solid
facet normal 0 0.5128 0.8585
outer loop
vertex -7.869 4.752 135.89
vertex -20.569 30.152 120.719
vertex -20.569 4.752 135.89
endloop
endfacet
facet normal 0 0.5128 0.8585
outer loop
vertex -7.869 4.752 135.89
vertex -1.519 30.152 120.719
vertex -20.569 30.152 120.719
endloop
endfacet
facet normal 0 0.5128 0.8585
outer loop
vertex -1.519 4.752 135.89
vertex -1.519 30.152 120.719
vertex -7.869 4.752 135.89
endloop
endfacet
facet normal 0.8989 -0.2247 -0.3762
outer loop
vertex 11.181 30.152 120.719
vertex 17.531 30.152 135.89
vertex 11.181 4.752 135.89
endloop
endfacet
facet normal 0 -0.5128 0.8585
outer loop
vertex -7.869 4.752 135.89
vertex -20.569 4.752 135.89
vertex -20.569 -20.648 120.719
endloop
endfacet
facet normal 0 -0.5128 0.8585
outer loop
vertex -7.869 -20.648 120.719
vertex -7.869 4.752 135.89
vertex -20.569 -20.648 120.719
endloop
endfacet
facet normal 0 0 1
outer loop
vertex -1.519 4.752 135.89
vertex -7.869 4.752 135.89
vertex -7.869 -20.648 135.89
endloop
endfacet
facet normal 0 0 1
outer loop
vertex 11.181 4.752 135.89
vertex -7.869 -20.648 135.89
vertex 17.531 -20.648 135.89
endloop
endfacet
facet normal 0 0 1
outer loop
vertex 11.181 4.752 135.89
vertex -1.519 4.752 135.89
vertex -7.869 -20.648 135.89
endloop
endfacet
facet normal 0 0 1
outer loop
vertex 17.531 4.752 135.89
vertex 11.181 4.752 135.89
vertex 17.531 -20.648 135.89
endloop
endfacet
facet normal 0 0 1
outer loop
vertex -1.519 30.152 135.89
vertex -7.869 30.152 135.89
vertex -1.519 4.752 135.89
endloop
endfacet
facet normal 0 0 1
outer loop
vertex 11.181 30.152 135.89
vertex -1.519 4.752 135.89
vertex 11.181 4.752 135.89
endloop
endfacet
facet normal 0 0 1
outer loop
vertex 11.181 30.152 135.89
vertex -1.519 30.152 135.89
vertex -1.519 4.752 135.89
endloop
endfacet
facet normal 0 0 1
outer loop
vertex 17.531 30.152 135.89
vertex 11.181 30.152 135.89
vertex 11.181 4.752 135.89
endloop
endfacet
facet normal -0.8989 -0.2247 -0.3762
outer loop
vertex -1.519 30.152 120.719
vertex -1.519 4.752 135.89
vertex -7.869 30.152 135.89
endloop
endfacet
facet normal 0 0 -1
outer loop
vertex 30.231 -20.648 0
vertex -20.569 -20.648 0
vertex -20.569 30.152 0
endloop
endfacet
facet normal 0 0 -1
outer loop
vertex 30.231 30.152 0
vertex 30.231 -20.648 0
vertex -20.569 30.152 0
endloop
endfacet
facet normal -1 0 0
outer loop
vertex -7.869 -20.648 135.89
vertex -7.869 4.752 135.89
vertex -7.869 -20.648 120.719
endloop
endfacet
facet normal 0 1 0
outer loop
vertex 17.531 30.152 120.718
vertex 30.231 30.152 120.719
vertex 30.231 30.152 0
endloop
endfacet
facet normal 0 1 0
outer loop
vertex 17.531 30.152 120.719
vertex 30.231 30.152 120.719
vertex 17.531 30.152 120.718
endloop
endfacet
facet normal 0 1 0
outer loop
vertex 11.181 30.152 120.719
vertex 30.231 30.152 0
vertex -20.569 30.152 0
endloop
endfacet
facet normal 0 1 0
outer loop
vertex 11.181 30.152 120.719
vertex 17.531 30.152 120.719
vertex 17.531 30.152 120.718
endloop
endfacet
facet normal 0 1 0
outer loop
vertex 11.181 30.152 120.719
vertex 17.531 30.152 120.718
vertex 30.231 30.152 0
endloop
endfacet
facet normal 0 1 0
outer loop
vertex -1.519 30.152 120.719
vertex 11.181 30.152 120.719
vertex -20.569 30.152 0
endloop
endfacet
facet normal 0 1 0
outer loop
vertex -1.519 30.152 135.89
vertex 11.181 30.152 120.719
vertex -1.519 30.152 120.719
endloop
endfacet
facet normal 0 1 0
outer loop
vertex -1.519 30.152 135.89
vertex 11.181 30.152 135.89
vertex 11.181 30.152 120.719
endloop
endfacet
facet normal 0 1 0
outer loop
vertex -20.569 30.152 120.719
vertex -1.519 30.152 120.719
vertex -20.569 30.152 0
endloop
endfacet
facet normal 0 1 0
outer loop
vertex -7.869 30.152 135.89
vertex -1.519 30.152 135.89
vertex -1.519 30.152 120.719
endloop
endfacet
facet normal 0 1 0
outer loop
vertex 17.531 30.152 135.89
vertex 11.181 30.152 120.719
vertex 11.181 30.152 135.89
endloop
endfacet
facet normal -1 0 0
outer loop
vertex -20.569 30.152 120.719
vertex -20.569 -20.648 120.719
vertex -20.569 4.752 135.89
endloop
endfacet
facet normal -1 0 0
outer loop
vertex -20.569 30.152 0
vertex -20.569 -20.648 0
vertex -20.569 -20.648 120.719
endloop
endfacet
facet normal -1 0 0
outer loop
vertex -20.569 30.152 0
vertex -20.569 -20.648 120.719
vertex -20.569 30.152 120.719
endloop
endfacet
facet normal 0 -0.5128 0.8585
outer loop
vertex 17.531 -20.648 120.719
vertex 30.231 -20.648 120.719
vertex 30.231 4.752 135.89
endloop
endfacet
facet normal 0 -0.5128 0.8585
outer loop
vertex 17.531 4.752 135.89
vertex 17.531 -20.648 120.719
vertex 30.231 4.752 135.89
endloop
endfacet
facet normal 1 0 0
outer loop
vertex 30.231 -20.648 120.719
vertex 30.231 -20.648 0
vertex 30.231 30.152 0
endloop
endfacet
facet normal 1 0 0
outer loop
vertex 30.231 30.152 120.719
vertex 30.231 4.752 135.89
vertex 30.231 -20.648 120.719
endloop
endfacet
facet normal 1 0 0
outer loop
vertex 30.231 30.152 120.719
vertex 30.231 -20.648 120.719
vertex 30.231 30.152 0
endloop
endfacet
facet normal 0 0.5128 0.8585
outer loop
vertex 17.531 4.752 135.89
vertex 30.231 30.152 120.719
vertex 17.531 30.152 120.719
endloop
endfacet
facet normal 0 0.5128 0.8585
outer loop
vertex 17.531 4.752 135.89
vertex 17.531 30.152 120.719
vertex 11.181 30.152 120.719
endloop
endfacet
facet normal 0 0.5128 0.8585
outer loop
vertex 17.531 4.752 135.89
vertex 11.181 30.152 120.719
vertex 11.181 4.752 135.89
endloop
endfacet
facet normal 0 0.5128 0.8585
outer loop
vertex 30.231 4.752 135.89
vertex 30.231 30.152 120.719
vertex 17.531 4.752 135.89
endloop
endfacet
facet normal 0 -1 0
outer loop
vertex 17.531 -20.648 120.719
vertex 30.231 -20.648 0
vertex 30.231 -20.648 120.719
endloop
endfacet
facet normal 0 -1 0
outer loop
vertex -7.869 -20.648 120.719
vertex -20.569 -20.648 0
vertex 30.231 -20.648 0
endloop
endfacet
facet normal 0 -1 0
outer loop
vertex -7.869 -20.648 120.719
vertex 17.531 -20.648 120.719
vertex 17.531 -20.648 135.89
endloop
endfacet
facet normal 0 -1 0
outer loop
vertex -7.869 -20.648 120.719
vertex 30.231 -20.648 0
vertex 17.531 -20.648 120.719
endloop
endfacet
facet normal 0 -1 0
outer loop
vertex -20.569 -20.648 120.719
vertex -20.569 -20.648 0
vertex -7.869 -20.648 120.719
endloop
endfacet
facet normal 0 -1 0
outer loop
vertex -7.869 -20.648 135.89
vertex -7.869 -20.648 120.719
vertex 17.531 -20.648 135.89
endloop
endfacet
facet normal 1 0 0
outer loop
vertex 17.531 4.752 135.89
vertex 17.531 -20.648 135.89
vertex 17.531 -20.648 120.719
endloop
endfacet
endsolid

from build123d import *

# Parameters (mm, degrees)
F0_W      = 50.8
F0_H      = 50.8
F1_DEPTH  = 135.89
F6_DEPTH  = 50.8
F11_W     = 12.7
F11_H     = 15.1711734065
F12_DEPTH = 27.7114
F13_DEPTH = 36.9062
F14_DEPTH = 15.1721734065
F17_DEPTH = 5.8166
F18_DEPTH = 25.654
F20_DEPTH = 50.8
F23_DEPTH = 9.906
F24_DEPTH = 28.194
F26_DEPTH = 3.556
F27_DEPTH = 33.528
F29_DEPTH = 12.7
F31_DEPTH = 12.7


with BuildPart() as f1:
    # F0 (on Top) → F1 (new body)
    with BuildSketch(Plane.XY):
        with Locations((4.8314797107, 4.7515430488)):
            Rectangle(F0_W, F0_H)
    extrude(amount=F1_DEPTH)

    # F5 (on face) + F3 (on face) → F6 (cut)
    with BuildSketch(Plane(origin=(-20.5685202893, 0, 0), x_dir=(0, -1, 0), z_dir=(-1, 0, 0))):
        Polygon((-4.7515430488, 120.7188265935), (-4.7515430488, 135.89), (-30.1515430488, 120.7188265935), align=None)
    with BuildSketch(Plane(origin=(-20.5685202893, 0, 0), x_dir=(0, -1, 0), z_dir=(-1, 0, 0))):
        Polygon((-30.1515430488, 135.89), (-30.1515430488, 120.7188265935), (-4.7515430488, 135.89), align=None)
    extrude(amount=-F6_DEPTH, mode=Mode.SUBTRACT)

    # F11 (on face) → F12 (join)
    with BuildSketch(Plane(origin=(0, 30.1515430488, 0), x_dir=(-1, 0, 0), z_dir=(0, 1, 0))):
        with Locations((-4.8314797107, 128.3044132968)):
            Rectangle(F11_W, F11_H)
    extrude(amount=-F12_DEPTH)

    # F2 (on face) → F13 (join)
    with BuildSketch(Plane(origin=(0, 30.1515430488, 0), x_dir=(-1, 0, 0), z_dir=(0, 1, 0))):
        Polygon((7.8685202893, 135.89), (-17.5314797107, 135.89), (-11.1814797107, 120.7188265935), (1.5185202893, 120.7188265935), align=None)
    extrude(amount=-F13_DEPTH)

    # F4 (on face) → F14 (cut, through all)
    with BuildSketch(Plane.XY.offset(135.89)):
        Polygon((17.5314797107, 4.7515430488), (17.5314797107, 30.1515430488), (11.1814797107, 4.7515430488), align=None)
    extrude(amount=-F14_DEPTH, mode=Mode.SUBTRACT)

    # F16 (on 3pt) → F17 (cut)
    with BuildSketch(Plane(origin=(-37.880335568, 9.470083892, 15.8550775482), x_dir=(-0.2072908126, -0.9744242912, 0.0867630094), z_dir=(-0.8988641792, 0.2247160448, 0.3762258452))):
        Polygon((4.8423883579, 129.6698123278), (-21.2242852978, 132.1215514099), (-21.2242852978, 115.6750623459), (3.5260916978, 115.6750623459), align=None)
    extrude(amount=-F17_DEPTH, mode=Mode.SUBTRACT)

    # F18 (add): a face of the model
    f18_faces = [f1.faces().sort_by_distance(p)[0] for p in [
        (30.2314797107, 4.0006963035, 64.3764433841),
    ]]
    extrude(f18_faces, amount=-F18_DEPTH)

    # F19 (on face) → F20 (join)
    with BuildSketch(Plane.YZ.offset(30.2314797107)):
        Polygon((30.1515430488, 120.7188265935), (4.7515430488, 135.89), (4.7515430488, 120.7188265935), align=None)
    extrude(amount=-F20_DEPTH)

    # F22 (on 3pt) → F23 (cut)
    with BuildSketch(Plane(origin=(45.6875894624, 11.4218973656, 19.1228578906), x_dir=(-0.2072908126, 0.9744242912, -0.0867630094), z_dir=(0.8988641792, 0.2247160448, 0.3762258452))):
        Polygon((19.221242587, 111.9441875016), (19.221242587, 128.4180545008), (-6.8454310687, 125.9389374835), (-5.5291344086, 111.9441875016), align=None)
    extrude(amount=-F23_DEPTH, mode=Mode.SUBTRACT)

    # F24 (add): a face of the model
    f24_faces = [f1.faces().sort_by_distance(p)[0] for p in [
        (-20.5685202893, 4.2653508293, 66.1393526656),
    ]]
    extrude(f24_faces, amount=-F24_DEPTH)

    # F25 (on face) → F26 (cut)
    with BuildSketch(Plane.XY.offset(135.89)):
        Polygon((-7.8685202893, 4.7515430488), (-1.5185202893, 4.7515430488), (-7.8685202893, 29.8561221751), align=None)
    extrude(amount=-F26_DEPTH, mode=Mode.SUBTRACT)

    # F27 (add): a face of the model
    f27_faces = [f1.faces().sort_by_distance(p)[0] for p in [
        (-20.5685202893, 4.2653508293, 66.1393526656),
    ]]
    extrude(f27_faces, amount=-F27_DEPTH)

    # F28 (on face) → F29 (cut)
    with BuildSketch(Plane.YZ.offset(30.2314797107)):
        Polygon((-20.6484569512, 135.89), (-20.6484569512, 120.7188265935), (4.7515430488, 135.89), align=None)
    extrude(amount=-F29_DEPTH, mode=Mode.SUBTRACT)

    # F30 (on face) → F31 (cut)
    with BuildSketch(Plane(origin=(-20.5685202893, 0, 0), x_dir=(0, -1, 0), z_dir=(-1, 0, 0))):
        Polygon((-4.7515430488, 135.89), (20.6484569512, 120.7188265935), (20.6484569512, 135.89), align=None)
    extrude(amount=-F31_DEPTH, mode=Mode.SUBTRACT)


solid = f1.part
